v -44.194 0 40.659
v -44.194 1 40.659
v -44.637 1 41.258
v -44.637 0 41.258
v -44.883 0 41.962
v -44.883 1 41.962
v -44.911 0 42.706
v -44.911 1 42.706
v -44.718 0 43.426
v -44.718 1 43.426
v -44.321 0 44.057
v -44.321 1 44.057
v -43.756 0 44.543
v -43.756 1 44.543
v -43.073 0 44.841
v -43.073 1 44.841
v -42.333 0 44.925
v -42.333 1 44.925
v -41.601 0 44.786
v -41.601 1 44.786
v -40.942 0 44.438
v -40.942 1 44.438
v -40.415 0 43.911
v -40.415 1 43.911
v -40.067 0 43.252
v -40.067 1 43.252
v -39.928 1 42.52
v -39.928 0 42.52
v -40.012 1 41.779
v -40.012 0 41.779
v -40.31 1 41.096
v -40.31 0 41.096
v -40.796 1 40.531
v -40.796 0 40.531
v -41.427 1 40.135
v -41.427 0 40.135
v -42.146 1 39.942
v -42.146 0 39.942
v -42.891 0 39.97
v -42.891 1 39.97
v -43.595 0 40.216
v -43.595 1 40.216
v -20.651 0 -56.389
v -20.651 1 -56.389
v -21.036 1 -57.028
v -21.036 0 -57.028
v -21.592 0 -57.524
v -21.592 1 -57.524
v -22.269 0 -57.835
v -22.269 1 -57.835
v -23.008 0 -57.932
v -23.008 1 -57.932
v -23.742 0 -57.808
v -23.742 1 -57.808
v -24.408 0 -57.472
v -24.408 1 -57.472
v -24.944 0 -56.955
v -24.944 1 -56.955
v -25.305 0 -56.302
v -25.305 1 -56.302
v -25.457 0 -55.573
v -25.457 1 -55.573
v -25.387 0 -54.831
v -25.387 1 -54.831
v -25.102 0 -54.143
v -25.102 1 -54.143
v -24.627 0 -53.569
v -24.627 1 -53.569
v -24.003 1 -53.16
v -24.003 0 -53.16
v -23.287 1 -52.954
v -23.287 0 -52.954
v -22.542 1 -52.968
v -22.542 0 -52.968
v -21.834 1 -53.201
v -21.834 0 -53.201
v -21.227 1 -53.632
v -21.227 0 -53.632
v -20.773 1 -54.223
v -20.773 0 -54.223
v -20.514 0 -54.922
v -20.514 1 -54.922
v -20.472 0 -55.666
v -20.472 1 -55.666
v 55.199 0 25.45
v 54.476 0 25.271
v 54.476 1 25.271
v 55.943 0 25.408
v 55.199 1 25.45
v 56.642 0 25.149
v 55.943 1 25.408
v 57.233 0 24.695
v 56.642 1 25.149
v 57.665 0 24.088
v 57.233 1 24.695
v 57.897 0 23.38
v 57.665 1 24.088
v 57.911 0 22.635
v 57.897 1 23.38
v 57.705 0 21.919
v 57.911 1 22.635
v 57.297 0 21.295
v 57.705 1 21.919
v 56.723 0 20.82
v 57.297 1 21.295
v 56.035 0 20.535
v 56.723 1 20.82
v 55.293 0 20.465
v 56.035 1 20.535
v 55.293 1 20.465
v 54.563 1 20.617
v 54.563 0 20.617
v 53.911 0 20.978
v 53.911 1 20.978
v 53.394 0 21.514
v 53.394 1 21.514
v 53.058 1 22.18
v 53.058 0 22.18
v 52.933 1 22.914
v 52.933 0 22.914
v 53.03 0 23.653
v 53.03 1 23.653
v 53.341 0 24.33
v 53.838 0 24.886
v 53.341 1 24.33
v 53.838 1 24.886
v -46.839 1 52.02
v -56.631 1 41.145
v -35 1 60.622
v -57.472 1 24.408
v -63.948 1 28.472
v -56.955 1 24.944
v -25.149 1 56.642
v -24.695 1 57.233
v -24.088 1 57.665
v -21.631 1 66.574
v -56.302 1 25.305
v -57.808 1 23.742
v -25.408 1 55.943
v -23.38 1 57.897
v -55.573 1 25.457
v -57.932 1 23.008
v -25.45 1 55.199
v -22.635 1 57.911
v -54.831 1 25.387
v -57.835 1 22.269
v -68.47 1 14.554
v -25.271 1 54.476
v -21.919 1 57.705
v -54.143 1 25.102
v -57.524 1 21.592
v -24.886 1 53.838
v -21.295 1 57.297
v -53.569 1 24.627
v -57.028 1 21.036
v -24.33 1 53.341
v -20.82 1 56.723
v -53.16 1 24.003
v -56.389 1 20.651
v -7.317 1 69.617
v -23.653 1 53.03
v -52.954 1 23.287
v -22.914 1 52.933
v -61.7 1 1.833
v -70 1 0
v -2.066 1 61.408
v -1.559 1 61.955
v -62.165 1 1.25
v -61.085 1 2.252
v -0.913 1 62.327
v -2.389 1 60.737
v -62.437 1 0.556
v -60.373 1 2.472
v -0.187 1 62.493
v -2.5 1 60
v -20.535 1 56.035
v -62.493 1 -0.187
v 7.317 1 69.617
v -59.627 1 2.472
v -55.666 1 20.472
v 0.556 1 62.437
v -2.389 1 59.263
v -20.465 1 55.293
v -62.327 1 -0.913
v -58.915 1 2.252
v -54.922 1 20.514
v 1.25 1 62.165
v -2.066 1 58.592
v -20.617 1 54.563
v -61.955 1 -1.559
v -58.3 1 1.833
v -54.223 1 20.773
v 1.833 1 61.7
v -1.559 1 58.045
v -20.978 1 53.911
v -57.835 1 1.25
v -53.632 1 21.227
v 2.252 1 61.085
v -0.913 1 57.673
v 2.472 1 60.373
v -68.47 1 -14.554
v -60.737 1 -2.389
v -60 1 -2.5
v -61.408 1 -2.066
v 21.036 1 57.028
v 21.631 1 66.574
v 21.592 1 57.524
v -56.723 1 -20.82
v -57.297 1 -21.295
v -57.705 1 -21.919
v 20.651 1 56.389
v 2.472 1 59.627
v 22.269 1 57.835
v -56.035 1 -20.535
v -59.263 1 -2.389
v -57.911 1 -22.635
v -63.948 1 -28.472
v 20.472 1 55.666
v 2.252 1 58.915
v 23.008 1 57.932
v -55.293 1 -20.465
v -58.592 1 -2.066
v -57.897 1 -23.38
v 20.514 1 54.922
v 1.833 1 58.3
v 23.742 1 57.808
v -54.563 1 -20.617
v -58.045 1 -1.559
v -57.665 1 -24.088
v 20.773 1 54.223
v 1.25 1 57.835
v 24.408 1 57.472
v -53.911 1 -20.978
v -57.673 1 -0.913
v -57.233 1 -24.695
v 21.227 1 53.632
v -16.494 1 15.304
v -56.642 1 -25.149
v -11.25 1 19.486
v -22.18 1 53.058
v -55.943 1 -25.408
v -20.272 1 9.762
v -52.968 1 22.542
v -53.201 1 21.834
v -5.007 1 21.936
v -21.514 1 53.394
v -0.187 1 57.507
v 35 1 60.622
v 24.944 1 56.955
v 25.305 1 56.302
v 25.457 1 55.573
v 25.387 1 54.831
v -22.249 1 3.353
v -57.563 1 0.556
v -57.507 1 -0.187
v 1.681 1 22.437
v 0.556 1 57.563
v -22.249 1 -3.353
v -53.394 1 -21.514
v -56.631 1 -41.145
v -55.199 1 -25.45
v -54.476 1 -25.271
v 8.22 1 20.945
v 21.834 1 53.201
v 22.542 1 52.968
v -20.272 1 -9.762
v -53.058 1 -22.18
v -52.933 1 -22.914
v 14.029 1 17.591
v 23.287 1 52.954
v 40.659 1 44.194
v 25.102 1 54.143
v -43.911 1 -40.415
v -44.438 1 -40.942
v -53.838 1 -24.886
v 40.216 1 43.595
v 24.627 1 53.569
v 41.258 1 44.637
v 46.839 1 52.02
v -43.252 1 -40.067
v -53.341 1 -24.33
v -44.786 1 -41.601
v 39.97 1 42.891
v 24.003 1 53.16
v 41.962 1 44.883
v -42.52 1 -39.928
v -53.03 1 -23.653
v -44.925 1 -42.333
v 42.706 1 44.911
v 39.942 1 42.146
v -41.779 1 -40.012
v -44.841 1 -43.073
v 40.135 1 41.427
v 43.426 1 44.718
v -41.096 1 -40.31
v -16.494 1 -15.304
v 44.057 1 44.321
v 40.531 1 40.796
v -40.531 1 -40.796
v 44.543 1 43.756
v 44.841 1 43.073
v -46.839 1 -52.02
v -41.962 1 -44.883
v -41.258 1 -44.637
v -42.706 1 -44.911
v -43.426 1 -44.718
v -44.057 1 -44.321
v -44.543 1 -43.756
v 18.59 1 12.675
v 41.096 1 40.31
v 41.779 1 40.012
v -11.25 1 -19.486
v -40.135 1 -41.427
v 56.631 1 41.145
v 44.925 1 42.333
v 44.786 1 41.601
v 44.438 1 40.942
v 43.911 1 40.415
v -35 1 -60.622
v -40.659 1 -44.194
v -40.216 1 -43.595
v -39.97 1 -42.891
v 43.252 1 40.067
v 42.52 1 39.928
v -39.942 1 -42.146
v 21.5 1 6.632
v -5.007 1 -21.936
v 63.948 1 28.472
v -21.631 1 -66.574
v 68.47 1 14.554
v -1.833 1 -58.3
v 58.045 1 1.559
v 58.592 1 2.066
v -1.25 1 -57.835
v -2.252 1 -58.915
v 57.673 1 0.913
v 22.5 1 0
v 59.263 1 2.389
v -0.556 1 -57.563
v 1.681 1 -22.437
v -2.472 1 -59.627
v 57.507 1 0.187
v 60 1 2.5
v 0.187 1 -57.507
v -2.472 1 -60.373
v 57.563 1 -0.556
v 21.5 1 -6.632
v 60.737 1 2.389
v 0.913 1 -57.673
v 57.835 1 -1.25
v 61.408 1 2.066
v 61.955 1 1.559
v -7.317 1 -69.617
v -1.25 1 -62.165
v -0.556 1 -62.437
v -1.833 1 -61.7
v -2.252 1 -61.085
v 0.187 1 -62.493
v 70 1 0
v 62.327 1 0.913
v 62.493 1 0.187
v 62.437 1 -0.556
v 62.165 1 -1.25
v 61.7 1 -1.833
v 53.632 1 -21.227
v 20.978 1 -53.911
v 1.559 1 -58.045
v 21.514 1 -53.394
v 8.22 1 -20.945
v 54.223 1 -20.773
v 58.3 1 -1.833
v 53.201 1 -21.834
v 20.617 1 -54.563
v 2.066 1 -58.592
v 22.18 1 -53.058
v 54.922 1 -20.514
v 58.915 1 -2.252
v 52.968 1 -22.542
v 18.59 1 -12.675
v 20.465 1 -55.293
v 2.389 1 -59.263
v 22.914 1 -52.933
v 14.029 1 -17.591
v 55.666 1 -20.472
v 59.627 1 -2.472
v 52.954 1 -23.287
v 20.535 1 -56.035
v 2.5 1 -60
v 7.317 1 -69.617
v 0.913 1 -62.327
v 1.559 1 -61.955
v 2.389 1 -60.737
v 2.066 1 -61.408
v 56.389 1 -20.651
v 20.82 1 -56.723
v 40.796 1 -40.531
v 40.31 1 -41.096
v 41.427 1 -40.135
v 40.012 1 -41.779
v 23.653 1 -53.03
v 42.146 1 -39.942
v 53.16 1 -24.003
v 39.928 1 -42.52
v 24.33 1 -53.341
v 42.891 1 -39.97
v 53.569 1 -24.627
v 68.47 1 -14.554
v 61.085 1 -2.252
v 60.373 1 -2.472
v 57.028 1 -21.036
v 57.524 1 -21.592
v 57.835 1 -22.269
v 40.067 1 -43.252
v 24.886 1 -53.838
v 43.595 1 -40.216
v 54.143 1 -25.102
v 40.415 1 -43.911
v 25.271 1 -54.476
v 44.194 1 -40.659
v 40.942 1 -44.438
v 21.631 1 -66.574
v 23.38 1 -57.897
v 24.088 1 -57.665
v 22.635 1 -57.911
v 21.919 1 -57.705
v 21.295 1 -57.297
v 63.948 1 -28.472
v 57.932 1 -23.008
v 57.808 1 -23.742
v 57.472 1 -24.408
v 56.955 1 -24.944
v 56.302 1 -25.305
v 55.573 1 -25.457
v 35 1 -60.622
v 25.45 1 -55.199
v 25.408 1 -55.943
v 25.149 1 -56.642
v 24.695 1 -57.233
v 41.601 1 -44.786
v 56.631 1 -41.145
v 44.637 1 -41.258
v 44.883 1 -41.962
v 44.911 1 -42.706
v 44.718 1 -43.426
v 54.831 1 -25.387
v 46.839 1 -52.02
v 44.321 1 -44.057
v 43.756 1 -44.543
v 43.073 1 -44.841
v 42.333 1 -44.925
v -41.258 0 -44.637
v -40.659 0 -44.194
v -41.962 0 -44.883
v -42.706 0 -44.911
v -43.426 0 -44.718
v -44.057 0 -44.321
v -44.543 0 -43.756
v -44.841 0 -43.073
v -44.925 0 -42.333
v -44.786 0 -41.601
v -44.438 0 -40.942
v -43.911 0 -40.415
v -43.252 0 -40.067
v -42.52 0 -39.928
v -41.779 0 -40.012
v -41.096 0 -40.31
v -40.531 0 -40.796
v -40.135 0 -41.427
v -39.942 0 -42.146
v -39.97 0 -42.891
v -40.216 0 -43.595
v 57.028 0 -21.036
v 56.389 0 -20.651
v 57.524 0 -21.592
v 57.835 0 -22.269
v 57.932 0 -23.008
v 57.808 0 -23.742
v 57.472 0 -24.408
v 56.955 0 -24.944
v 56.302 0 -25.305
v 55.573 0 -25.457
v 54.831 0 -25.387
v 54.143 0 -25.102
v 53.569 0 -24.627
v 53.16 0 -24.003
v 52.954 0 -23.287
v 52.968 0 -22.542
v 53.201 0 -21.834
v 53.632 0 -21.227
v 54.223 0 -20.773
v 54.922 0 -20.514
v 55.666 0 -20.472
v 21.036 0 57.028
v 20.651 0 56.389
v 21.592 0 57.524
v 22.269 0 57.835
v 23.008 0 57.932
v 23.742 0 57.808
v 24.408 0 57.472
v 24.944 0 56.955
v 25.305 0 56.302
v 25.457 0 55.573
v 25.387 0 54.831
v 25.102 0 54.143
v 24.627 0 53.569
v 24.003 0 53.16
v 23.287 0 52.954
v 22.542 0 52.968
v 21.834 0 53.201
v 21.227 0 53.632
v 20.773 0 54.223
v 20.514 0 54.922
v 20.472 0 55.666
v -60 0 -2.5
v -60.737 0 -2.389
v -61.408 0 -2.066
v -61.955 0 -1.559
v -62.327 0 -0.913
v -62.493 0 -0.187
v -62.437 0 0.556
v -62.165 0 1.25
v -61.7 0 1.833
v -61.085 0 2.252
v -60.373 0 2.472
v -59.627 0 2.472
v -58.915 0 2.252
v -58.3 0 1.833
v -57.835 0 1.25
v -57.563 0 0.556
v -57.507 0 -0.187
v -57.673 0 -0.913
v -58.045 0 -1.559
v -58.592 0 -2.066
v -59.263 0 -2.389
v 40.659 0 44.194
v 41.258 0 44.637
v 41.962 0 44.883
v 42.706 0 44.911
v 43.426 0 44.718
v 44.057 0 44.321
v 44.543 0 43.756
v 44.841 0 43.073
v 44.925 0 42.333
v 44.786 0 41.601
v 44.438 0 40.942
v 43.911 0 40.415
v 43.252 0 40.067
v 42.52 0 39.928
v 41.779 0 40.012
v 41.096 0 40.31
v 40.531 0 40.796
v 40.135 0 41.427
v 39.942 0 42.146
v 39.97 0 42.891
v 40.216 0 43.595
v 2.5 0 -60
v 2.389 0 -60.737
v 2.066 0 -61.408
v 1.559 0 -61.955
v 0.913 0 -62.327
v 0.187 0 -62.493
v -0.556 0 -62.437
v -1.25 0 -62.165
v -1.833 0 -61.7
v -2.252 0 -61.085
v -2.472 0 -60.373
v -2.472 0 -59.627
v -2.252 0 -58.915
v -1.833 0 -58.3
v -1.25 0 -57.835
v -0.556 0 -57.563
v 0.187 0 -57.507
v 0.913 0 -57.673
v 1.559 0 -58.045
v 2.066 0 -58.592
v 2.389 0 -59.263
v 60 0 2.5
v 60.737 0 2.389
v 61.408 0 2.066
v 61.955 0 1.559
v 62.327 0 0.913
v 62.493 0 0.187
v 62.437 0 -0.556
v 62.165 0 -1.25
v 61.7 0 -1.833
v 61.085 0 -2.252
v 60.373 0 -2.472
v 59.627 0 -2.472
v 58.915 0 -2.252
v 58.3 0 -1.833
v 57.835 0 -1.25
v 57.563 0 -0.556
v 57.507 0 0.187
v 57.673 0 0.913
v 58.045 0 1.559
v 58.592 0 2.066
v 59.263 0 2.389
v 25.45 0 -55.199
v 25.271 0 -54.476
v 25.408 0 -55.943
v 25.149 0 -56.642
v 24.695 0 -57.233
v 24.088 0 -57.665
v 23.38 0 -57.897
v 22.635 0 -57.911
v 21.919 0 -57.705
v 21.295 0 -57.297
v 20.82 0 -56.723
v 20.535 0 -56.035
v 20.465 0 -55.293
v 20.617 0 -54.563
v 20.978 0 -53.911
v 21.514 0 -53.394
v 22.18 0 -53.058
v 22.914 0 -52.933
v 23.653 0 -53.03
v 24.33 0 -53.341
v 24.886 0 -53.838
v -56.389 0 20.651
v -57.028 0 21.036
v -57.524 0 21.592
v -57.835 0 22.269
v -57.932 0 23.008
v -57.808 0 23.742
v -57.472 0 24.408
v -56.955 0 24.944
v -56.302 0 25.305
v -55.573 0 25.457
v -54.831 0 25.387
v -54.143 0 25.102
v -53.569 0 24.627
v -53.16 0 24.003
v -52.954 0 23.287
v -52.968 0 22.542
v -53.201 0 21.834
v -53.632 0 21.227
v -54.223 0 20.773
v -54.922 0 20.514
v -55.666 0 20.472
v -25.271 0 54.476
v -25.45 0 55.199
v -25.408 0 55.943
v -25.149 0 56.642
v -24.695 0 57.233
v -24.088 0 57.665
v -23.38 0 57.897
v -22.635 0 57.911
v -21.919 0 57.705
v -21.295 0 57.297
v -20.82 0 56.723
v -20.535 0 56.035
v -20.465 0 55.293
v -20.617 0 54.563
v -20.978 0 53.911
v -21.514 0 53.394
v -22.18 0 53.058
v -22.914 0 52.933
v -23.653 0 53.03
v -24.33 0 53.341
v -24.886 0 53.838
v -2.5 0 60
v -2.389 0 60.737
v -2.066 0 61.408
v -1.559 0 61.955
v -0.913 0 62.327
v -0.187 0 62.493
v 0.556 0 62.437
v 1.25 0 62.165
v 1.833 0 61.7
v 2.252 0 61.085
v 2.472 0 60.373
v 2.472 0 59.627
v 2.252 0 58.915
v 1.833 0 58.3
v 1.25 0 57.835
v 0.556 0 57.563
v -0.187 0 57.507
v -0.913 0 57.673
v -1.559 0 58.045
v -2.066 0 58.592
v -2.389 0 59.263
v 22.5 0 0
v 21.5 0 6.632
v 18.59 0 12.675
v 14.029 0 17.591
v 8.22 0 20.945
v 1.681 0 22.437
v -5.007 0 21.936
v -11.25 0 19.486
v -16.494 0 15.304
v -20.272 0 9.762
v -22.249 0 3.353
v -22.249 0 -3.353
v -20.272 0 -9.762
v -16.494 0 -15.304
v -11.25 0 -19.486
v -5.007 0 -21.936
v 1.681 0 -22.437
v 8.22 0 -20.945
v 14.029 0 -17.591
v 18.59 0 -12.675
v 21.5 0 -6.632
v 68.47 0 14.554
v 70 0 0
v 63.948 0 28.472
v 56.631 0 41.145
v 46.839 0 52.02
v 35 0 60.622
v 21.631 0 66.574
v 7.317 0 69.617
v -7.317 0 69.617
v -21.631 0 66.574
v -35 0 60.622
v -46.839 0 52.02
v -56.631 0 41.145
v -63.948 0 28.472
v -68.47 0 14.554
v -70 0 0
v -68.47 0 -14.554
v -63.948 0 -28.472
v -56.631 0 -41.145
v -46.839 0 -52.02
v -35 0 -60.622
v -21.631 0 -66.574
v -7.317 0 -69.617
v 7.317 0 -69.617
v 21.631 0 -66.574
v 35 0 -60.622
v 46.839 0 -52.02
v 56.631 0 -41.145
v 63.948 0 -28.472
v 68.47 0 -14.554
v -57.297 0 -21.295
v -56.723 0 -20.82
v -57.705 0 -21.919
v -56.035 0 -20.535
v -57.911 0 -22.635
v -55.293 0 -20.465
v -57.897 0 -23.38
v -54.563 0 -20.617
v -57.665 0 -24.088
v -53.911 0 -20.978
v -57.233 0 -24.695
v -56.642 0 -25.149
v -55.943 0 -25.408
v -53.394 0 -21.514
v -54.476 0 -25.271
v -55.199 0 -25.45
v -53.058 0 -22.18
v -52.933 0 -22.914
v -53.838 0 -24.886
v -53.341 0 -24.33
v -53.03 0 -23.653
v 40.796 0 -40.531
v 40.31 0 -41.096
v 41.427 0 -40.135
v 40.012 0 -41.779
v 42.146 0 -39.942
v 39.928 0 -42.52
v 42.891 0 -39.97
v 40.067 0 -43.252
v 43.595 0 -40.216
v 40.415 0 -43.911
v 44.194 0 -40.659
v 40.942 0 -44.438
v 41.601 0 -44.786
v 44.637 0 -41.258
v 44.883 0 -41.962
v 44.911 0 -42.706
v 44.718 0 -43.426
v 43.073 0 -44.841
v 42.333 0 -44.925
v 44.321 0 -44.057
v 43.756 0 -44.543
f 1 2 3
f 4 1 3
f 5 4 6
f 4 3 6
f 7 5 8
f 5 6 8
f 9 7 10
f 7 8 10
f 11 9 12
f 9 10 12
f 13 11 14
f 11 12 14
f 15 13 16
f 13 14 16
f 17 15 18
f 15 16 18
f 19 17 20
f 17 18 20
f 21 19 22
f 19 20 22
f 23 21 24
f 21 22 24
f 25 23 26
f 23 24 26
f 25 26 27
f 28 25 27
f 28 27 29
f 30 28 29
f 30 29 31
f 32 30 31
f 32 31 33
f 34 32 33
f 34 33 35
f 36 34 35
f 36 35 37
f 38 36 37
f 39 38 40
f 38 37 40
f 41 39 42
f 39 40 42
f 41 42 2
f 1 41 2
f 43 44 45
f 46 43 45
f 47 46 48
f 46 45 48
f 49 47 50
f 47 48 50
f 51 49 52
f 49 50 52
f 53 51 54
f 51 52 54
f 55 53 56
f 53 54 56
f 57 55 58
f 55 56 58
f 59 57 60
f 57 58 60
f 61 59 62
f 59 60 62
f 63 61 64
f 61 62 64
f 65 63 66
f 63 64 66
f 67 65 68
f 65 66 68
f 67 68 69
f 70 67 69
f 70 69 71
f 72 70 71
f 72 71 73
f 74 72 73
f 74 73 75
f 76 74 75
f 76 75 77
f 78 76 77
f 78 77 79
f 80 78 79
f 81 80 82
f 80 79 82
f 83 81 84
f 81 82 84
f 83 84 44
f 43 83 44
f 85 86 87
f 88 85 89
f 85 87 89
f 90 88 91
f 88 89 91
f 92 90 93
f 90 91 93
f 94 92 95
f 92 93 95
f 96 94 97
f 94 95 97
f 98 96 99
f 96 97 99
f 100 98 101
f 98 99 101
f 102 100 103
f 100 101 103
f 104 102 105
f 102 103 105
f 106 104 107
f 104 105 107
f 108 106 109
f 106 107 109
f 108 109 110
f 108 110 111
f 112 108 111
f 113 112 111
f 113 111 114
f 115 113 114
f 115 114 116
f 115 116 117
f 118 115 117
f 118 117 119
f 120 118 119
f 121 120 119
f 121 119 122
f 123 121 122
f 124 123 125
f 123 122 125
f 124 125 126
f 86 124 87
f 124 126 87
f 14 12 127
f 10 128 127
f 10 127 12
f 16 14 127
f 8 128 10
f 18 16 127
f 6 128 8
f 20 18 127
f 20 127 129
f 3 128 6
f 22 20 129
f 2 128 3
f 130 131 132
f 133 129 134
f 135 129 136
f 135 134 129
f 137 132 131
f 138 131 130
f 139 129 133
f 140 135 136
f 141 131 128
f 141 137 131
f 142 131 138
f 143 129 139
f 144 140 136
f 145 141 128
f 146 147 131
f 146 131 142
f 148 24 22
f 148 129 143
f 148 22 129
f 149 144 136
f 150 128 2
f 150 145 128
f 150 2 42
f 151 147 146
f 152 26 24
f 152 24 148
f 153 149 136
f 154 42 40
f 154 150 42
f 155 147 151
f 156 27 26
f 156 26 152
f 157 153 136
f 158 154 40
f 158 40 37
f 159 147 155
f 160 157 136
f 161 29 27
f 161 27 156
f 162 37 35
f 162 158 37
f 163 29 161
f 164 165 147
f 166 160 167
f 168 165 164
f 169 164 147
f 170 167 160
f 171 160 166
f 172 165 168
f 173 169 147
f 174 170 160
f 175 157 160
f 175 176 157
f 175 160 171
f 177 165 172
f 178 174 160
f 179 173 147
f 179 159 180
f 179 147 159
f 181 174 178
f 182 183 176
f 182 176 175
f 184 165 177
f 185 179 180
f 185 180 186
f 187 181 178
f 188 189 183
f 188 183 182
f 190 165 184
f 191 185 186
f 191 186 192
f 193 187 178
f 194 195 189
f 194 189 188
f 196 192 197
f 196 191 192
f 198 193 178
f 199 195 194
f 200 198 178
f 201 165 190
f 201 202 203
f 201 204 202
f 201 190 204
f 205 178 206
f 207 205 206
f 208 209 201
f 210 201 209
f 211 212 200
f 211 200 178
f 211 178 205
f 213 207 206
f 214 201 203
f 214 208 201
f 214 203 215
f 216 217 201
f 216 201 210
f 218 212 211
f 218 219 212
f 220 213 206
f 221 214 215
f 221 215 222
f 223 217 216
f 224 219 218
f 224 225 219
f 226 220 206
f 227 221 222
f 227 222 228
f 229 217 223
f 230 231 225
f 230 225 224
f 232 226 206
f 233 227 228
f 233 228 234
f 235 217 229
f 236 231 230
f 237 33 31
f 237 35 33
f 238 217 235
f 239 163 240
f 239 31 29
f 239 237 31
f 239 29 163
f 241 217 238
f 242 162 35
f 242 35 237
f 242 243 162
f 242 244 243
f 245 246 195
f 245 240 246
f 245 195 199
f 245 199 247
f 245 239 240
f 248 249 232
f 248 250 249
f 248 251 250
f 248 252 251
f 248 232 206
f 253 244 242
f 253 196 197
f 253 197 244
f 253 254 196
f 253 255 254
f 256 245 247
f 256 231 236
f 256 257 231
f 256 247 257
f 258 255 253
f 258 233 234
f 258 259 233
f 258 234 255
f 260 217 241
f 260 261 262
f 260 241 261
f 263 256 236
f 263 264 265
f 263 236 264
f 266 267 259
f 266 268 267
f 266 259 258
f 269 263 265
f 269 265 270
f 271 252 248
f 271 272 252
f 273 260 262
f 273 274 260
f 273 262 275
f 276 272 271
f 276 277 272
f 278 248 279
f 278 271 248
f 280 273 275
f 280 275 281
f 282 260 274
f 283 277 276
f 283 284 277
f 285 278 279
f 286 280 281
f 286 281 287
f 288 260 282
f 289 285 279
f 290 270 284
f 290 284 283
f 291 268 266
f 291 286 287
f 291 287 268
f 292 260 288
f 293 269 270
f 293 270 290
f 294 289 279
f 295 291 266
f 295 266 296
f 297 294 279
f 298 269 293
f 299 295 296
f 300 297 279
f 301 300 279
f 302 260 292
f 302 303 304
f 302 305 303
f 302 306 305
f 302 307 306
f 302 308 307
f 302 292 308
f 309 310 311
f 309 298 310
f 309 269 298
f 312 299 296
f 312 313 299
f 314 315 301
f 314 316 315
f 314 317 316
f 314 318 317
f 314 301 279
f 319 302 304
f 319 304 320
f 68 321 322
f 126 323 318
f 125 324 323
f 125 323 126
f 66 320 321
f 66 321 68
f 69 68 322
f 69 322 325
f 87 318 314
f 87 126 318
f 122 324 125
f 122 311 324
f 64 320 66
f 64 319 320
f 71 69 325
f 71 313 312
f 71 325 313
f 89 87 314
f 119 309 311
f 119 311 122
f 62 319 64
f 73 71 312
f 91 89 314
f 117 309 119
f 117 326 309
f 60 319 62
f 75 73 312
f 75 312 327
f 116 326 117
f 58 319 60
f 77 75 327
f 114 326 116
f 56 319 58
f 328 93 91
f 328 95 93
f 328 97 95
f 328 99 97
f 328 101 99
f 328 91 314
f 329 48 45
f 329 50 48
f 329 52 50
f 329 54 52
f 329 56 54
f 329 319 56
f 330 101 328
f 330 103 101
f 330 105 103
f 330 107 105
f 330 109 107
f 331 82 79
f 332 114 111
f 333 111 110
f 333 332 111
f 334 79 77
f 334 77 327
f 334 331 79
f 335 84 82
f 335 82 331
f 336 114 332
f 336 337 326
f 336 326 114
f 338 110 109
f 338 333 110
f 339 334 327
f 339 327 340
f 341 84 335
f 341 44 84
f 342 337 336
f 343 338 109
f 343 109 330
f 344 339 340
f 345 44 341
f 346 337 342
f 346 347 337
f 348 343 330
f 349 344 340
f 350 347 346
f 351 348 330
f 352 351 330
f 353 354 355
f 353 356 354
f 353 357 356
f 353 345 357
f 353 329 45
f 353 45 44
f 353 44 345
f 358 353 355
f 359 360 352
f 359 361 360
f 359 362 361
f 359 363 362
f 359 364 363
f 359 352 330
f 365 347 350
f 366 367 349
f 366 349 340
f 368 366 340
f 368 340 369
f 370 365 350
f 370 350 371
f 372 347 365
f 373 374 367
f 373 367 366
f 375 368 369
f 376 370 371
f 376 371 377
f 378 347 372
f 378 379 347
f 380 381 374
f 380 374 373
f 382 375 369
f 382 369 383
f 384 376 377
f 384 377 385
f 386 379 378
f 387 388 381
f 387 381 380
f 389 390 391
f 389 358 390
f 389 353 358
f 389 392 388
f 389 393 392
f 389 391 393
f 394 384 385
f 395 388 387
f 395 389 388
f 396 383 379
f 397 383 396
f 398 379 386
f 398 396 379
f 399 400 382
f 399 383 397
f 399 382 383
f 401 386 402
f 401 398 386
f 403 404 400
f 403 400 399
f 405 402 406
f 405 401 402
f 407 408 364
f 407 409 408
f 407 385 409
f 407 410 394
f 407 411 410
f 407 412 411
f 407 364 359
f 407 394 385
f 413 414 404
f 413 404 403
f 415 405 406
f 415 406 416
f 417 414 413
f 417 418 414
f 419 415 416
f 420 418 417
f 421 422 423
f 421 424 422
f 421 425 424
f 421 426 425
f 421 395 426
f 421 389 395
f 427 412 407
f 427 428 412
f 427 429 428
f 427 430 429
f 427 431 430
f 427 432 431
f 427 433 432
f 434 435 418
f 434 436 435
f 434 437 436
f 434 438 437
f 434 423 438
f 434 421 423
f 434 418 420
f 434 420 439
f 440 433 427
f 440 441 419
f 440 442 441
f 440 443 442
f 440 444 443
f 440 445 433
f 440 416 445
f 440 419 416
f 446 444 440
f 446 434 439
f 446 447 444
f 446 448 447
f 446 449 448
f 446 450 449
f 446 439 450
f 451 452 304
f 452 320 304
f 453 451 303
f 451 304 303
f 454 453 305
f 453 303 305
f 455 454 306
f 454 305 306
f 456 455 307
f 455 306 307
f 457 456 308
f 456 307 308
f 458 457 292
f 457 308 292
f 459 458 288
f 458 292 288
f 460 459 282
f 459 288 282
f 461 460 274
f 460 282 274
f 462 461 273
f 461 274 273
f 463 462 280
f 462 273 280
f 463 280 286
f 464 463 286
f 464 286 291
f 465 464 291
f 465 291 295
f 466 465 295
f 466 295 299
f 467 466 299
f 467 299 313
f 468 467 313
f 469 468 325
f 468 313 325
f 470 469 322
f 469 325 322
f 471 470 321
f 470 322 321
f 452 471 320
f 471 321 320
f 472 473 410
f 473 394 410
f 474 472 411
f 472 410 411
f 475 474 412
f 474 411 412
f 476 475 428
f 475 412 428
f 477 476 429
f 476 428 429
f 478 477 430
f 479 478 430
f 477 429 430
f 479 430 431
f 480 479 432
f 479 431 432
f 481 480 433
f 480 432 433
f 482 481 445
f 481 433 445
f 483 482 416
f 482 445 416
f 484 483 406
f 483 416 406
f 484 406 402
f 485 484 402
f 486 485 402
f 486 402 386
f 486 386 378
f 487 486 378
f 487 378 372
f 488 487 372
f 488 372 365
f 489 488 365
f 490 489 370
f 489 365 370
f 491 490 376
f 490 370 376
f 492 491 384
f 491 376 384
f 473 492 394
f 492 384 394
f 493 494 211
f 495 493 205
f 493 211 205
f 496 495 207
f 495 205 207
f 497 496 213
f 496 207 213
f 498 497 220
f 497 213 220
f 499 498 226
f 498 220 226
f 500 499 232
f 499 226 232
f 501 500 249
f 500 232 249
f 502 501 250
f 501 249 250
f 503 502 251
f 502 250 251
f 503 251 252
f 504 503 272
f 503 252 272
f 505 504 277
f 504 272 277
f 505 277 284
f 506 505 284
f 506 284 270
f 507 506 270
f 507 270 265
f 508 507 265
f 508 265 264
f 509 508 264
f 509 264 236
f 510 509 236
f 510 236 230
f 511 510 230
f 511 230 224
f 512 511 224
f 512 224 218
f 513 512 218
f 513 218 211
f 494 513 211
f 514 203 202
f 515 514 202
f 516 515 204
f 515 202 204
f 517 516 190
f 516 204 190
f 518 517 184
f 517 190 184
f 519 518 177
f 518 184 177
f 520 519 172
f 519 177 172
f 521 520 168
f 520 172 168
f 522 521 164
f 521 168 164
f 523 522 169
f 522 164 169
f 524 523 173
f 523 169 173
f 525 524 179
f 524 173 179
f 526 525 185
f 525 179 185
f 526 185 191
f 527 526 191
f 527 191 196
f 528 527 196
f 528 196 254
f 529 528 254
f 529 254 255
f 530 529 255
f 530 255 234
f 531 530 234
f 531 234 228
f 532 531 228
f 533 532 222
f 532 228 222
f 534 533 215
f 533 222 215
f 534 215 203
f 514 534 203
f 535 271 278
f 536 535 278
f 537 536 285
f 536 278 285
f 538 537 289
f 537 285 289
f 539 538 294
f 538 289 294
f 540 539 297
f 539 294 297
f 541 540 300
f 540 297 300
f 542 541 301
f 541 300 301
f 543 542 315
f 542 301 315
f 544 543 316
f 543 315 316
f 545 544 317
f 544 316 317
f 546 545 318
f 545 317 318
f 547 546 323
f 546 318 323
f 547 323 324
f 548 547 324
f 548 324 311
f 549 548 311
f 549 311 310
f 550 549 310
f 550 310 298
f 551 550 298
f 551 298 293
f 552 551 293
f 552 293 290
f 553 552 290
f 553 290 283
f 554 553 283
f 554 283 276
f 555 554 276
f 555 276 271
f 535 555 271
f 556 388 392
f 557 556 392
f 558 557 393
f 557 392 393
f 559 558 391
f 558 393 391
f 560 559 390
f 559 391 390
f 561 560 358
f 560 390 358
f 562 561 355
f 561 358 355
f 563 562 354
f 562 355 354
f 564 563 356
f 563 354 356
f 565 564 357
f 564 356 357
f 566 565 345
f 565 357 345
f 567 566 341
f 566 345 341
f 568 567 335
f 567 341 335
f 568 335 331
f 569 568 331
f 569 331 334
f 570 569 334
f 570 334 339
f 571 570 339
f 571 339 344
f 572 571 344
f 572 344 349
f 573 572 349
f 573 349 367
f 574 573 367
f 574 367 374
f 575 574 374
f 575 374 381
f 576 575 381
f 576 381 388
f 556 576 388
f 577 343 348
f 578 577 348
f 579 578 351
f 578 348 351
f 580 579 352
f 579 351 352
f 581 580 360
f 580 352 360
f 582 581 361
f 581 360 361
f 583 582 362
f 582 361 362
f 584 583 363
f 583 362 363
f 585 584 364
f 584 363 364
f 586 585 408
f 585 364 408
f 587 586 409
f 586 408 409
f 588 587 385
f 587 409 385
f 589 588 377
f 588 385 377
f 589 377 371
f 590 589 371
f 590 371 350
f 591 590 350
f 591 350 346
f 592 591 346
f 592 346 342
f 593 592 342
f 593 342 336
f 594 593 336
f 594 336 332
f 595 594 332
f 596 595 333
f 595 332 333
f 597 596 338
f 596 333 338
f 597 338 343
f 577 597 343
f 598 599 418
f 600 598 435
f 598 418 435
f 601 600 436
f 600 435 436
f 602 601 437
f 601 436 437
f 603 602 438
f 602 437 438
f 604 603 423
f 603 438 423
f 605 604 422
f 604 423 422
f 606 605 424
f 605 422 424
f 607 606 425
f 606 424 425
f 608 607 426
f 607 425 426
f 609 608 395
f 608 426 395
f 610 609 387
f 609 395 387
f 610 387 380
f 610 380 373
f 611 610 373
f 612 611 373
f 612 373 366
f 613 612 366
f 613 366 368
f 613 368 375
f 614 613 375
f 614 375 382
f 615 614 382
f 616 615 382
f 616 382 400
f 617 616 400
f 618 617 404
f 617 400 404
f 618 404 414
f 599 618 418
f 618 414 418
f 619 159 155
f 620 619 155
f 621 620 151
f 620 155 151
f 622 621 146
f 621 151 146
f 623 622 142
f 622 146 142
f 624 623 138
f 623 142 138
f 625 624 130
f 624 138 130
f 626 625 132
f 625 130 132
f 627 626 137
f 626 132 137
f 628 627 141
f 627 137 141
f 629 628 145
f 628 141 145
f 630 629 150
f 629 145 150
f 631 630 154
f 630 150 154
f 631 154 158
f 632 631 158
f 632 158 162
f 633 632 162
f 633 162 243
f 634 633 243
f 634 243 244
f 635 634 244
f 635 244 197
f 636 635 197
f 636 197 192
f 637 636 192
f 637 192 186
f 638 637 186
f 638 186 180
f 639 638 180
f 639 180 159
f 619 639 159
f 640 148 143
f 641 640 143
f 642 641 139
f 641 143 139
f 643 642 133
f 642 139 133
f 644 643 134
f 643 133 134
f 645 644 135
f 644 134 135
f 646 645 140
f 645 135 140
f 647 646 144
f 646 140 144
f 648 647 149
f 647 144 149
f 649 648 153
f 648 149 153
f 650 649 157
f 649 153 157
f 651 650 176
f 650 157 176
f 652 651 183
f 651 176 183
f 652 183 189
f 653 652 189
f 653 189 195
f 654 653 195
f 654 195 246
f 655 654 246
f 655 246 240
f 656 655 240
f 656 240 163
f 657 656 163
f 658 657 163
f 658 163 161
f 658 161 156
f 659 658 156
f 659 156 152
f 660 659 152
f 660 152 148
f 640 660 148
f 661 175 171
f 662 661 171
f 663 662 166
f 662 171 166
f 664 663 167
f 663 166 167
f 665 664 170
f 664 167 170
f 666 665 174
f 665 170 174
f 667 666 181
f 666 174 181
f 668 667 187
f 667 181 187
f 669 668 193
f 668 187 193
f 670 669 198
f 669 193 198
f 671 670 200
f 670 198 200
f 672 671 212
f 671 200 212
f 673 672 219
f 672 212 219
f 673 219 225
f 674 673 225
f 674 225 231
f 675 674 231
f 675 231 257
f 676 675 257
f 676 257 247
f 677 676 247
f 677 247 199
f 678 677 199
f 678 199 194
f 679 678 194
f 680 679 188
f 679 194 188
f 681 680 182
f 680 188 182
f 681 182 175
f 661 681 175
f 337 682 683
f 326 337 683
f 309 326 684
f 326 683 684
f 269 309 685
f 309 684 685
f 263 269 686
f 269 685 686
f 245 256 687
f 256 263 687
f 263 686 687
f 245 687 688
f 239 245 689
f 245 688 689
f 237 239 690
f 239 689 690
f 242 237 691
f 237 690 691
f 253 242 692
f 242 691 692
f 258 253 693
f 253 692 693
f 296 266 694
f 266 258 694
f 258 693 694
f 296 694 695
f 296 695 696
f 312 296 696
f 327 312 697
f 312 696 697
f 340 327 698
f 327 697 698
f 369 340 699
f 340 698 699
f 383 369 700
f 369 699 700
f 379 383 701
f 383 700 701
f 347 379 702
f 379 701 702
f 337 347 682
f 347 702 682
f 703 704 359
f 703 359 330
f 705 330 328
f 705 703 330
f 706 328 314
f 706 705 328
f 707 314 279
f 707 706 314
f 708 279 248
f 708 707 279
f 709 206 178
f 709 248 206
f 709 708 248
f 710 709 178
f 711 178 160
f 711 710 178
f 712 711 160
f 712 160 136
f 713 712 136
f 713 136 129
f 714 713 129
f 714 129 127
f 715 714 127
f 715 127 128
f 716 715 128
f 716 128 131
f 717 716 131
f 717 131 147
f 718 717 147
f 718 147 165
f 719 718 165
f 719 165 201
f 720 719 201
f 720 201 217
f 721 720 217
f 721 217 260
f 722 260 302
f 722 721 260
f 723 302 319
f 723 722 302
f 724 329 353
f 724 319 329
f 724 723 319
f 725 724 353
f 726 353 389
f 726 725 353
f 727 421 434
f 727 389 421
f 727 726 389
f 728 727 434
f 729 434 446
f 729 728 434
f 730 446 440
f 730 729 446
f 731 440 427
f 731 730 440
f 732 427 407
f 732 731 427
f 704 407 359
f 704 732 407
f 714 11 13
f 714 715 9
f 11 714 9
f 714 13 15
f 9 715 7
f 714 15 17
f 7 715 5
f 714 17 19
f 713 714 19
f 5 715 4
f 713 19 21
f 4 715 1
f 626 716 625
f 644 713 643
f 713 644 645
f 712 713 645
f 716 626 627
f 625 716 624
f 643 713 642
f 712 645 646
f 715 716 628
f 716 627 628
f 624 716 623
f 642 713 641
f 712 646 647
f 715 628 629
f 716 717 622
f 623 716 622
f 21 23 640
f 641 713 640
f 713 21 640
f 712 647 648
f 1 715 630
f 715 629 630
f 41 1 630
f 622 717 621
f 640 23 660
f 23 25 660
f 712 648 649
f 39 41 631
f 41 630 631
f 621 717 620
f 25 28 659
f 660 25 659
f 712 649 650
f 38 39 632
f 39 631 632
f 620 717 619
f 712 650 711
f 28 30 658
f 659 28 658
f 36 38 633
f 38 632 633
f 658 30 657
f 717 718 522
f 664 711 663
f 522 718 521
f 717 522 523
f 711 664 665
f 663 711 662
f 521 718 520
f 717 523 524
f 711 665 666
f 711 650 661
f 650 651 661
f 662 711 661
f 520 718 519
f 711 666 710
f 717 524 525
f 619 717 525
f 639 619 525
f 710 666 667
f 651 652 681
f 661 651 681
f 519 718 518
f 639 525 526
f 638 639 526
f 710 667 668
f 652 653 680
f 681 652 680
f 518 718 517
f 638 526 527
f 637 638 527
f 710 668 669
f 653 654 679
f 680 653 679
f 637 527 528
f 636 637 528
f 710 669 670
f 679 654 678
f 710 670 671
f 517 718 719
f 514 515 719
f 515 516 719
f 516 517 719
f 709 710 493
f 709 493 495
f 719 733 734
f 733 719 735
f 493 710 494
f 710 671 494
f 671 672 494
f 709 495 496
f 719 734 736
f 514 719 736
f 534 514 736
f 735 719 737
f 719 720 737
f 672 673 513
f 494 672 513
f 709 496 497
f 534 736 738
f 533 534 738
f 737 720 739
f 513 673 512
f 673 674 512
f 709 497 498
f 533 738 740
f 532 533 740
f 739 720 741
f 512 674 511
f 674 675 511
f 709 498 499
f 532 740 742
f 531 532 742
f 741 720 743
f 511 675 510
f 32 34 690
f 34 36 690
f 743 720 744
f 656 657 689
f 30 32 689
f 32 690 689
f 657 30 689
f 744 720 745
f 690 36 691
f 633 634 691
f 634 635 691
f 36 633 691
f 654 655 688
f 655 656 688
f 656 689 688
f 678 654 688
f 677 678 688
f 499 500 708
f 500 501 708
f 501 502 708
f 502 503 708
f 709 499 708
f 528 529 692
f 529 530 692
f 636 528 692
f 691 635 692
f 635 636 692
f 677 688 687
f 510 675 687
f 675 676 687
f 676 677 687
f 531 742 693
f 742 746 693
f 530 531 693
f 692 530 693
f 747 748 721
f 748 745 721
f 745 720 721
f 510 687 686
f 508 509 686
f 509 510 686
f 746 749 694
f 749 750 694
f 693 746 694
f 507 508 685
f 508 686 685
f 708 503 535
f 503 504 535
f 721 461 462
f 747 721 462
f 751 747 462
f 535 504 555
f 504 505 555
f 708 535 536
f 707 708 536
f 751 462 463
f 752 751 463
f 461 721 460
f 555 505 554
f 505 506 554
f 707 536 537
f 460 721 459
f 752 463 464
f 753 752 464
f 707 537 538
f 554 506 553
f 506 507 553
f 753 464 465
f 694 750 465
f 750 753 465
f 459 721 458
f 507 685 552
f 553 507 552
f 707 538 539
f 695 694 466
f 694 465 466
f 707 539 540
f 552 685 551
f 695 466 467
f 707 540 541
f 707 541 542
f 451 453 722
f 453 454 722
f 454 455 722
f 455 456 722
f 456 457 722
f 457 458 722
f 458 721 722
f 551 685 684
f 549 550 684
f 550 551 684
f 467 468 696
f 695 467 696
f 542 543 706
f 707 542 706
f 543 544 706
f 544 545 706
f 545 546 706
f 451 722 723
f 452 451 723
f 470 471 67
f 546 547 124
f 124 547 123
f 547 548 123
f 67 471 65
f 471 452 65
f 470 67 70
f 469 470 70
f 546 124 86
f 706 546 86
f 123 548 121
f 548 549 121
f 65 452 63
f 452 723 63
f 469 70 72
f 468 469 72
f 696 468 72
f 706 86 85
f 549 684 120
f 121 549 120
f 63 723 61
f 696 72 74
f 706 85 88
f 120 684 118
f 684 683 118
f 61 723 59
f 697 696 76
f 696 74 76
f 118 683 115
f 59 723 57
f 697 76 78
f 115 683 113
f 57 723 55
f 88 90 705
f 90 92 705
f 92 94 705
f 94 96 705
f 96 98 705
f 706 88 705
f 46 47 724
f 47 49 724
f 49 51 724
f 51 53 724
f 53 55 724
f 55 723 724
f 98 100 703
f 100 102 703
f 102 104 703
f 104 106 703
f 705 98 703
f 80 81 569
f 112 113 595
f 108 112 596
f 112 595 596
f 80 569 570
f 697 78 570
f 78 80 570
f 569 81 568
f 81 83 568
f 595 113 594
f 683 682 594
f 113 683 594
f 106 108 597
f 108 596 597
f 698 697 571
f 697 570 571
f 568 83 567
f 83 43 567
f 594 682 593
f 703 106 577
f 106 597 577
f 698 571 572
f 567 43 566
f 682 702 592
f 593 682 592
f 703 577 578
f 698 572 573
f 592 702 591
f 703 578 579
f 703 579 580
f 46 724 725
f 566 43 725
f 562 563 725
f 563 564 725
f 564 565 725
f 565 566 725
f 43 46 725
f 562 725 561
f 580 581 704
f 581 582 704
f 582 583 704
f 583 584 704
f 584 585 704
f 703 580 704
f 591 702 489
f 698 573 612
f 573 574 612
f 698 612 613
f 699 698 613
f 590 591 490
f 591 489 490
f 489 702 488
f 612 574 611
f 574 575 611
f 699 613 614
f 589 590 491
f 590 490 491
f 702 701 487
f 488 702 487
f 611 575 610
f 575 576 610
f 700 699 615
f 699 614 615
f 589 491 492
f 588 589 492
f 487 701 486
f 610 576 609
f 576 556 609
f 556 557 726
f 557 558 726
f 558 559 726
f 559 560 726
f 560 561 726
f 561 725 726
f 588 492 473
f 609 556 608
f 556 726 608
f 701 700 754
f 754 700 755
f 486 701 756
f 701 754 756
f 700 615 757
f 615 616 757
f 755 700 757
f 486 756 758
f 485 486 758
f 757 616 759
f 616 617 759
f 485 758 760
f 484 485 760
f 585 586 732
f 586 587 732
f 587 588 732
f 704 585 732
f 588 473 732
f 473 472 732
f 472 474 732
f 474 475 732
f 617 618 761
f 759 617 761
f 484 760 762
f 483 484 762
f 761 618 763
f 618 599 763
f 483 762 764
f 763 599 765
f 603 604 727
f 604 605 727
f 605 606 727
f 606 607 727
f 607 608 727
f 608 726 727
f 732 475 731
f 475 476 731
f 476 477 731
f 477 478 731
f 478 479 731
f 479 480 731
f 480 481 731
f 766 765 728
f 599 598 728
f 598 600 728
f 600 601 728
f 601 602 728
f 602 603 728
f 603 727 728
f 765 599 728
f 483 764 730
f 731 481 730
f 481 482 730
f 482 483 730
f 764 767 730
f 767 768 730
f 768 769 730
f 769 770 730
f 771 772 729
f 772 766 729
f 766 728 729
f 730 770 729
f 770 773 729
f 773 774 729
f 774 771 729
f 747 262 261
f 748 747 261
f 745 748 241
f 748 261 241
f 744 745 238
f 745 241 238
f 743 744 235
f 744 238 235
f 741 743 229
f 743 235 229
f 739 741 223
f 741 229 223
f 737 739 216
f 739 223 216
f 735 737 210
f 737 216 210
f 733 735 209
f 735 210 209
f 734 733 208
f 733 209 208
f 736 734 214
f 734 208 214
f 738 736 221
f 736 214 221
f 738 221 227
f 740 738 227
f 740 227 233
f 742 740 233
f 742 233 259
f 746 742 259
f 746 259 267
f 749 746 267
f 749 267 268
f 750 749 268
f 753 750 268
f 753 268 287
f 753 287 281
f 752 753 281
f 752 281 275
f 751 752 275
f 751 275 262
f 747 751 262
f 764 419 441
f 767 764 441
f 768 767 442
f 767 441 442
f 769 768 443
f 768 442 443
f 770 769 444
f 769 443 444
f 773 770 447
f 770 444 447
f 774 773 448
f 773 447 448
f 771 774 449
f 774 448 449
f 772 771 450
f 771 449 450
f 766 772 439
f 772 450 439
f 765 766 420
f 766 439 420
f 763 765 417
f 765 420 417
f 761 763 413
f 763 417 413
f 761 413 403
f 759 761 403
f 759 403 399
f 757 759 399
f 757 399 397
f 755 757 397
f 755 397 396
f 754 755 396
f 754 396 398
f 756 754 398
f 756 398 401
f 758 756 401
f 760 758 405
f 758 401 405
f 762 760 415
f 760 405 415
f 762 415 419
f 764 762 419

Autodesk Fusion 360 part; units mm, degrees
sketch "Sketch1" plane through (0, 0, 0) normal (0, 1, 0) x (1, 0, 0)
  circle A0 centre (0, 0) radius 60 construction
  circle A1 centre (0, 0) radius 22.5
  circle A2 centre (0, 0) radius 70
  point P0 (-60, 0)
  dimension "d1" = 120
  dimension "d2" = 45
  dimension "d3" = 140
extrude "Extrude1" add sketch "Sketch1" along normal blind 1
hole "Hole1" at (-60, 0, 0) direction (0, 1, 0) diameter 5 depth 30 tip angle 118
pattern_circular "C-Pattern1" count 16 over 360 about axis through (0, 1.75, 0) along (0, 1, 0) of "Hole1"
sketch "cutting pattern" plane through (0, 1, 0) normal (0, 1, 0) x (-1, 0, 0)
  circle A0 centre (55.4328, -22.961) radius 2.5
  circle A1 centre (42.4264, -42.4264) radius 2.5
  circle A2 centre (22.961, -55.4328) radius 2.5
  circle A3 centre (0, -60) radius 2.5
  circle A4 centre (-22.961, -55.4328) radius 2.5
  circle A5 centre (-42.4264, -42.4264) radius 2.5
  circle A6 centre (-55.4328, -22.961) radius 2.5
  circle A7 centre (-60, 0) radius 2.5
  circle A8 centre (-55.4328, 22.961) radius 2.5
  circle A9 centre (-42.4264, 42.4264) radius 2.5
  circle A10 centre (-22.961, 55.4328) radius 2.5
  circle A11 centre (0, 60) radius 2.5
  circle A12 centre (22.961, 55.4328) radius 2.5
  circle A13 centre (42.4264, 42.4264) radius 2.5
  circle A14 centre (55.4328, 22.961) radius 2.5
  circle A15 centre (60, 0) radius 2.5
  circle A16 centre (0, 0) radius 22.5
  circle A17 centre (0, 0) radius 70
